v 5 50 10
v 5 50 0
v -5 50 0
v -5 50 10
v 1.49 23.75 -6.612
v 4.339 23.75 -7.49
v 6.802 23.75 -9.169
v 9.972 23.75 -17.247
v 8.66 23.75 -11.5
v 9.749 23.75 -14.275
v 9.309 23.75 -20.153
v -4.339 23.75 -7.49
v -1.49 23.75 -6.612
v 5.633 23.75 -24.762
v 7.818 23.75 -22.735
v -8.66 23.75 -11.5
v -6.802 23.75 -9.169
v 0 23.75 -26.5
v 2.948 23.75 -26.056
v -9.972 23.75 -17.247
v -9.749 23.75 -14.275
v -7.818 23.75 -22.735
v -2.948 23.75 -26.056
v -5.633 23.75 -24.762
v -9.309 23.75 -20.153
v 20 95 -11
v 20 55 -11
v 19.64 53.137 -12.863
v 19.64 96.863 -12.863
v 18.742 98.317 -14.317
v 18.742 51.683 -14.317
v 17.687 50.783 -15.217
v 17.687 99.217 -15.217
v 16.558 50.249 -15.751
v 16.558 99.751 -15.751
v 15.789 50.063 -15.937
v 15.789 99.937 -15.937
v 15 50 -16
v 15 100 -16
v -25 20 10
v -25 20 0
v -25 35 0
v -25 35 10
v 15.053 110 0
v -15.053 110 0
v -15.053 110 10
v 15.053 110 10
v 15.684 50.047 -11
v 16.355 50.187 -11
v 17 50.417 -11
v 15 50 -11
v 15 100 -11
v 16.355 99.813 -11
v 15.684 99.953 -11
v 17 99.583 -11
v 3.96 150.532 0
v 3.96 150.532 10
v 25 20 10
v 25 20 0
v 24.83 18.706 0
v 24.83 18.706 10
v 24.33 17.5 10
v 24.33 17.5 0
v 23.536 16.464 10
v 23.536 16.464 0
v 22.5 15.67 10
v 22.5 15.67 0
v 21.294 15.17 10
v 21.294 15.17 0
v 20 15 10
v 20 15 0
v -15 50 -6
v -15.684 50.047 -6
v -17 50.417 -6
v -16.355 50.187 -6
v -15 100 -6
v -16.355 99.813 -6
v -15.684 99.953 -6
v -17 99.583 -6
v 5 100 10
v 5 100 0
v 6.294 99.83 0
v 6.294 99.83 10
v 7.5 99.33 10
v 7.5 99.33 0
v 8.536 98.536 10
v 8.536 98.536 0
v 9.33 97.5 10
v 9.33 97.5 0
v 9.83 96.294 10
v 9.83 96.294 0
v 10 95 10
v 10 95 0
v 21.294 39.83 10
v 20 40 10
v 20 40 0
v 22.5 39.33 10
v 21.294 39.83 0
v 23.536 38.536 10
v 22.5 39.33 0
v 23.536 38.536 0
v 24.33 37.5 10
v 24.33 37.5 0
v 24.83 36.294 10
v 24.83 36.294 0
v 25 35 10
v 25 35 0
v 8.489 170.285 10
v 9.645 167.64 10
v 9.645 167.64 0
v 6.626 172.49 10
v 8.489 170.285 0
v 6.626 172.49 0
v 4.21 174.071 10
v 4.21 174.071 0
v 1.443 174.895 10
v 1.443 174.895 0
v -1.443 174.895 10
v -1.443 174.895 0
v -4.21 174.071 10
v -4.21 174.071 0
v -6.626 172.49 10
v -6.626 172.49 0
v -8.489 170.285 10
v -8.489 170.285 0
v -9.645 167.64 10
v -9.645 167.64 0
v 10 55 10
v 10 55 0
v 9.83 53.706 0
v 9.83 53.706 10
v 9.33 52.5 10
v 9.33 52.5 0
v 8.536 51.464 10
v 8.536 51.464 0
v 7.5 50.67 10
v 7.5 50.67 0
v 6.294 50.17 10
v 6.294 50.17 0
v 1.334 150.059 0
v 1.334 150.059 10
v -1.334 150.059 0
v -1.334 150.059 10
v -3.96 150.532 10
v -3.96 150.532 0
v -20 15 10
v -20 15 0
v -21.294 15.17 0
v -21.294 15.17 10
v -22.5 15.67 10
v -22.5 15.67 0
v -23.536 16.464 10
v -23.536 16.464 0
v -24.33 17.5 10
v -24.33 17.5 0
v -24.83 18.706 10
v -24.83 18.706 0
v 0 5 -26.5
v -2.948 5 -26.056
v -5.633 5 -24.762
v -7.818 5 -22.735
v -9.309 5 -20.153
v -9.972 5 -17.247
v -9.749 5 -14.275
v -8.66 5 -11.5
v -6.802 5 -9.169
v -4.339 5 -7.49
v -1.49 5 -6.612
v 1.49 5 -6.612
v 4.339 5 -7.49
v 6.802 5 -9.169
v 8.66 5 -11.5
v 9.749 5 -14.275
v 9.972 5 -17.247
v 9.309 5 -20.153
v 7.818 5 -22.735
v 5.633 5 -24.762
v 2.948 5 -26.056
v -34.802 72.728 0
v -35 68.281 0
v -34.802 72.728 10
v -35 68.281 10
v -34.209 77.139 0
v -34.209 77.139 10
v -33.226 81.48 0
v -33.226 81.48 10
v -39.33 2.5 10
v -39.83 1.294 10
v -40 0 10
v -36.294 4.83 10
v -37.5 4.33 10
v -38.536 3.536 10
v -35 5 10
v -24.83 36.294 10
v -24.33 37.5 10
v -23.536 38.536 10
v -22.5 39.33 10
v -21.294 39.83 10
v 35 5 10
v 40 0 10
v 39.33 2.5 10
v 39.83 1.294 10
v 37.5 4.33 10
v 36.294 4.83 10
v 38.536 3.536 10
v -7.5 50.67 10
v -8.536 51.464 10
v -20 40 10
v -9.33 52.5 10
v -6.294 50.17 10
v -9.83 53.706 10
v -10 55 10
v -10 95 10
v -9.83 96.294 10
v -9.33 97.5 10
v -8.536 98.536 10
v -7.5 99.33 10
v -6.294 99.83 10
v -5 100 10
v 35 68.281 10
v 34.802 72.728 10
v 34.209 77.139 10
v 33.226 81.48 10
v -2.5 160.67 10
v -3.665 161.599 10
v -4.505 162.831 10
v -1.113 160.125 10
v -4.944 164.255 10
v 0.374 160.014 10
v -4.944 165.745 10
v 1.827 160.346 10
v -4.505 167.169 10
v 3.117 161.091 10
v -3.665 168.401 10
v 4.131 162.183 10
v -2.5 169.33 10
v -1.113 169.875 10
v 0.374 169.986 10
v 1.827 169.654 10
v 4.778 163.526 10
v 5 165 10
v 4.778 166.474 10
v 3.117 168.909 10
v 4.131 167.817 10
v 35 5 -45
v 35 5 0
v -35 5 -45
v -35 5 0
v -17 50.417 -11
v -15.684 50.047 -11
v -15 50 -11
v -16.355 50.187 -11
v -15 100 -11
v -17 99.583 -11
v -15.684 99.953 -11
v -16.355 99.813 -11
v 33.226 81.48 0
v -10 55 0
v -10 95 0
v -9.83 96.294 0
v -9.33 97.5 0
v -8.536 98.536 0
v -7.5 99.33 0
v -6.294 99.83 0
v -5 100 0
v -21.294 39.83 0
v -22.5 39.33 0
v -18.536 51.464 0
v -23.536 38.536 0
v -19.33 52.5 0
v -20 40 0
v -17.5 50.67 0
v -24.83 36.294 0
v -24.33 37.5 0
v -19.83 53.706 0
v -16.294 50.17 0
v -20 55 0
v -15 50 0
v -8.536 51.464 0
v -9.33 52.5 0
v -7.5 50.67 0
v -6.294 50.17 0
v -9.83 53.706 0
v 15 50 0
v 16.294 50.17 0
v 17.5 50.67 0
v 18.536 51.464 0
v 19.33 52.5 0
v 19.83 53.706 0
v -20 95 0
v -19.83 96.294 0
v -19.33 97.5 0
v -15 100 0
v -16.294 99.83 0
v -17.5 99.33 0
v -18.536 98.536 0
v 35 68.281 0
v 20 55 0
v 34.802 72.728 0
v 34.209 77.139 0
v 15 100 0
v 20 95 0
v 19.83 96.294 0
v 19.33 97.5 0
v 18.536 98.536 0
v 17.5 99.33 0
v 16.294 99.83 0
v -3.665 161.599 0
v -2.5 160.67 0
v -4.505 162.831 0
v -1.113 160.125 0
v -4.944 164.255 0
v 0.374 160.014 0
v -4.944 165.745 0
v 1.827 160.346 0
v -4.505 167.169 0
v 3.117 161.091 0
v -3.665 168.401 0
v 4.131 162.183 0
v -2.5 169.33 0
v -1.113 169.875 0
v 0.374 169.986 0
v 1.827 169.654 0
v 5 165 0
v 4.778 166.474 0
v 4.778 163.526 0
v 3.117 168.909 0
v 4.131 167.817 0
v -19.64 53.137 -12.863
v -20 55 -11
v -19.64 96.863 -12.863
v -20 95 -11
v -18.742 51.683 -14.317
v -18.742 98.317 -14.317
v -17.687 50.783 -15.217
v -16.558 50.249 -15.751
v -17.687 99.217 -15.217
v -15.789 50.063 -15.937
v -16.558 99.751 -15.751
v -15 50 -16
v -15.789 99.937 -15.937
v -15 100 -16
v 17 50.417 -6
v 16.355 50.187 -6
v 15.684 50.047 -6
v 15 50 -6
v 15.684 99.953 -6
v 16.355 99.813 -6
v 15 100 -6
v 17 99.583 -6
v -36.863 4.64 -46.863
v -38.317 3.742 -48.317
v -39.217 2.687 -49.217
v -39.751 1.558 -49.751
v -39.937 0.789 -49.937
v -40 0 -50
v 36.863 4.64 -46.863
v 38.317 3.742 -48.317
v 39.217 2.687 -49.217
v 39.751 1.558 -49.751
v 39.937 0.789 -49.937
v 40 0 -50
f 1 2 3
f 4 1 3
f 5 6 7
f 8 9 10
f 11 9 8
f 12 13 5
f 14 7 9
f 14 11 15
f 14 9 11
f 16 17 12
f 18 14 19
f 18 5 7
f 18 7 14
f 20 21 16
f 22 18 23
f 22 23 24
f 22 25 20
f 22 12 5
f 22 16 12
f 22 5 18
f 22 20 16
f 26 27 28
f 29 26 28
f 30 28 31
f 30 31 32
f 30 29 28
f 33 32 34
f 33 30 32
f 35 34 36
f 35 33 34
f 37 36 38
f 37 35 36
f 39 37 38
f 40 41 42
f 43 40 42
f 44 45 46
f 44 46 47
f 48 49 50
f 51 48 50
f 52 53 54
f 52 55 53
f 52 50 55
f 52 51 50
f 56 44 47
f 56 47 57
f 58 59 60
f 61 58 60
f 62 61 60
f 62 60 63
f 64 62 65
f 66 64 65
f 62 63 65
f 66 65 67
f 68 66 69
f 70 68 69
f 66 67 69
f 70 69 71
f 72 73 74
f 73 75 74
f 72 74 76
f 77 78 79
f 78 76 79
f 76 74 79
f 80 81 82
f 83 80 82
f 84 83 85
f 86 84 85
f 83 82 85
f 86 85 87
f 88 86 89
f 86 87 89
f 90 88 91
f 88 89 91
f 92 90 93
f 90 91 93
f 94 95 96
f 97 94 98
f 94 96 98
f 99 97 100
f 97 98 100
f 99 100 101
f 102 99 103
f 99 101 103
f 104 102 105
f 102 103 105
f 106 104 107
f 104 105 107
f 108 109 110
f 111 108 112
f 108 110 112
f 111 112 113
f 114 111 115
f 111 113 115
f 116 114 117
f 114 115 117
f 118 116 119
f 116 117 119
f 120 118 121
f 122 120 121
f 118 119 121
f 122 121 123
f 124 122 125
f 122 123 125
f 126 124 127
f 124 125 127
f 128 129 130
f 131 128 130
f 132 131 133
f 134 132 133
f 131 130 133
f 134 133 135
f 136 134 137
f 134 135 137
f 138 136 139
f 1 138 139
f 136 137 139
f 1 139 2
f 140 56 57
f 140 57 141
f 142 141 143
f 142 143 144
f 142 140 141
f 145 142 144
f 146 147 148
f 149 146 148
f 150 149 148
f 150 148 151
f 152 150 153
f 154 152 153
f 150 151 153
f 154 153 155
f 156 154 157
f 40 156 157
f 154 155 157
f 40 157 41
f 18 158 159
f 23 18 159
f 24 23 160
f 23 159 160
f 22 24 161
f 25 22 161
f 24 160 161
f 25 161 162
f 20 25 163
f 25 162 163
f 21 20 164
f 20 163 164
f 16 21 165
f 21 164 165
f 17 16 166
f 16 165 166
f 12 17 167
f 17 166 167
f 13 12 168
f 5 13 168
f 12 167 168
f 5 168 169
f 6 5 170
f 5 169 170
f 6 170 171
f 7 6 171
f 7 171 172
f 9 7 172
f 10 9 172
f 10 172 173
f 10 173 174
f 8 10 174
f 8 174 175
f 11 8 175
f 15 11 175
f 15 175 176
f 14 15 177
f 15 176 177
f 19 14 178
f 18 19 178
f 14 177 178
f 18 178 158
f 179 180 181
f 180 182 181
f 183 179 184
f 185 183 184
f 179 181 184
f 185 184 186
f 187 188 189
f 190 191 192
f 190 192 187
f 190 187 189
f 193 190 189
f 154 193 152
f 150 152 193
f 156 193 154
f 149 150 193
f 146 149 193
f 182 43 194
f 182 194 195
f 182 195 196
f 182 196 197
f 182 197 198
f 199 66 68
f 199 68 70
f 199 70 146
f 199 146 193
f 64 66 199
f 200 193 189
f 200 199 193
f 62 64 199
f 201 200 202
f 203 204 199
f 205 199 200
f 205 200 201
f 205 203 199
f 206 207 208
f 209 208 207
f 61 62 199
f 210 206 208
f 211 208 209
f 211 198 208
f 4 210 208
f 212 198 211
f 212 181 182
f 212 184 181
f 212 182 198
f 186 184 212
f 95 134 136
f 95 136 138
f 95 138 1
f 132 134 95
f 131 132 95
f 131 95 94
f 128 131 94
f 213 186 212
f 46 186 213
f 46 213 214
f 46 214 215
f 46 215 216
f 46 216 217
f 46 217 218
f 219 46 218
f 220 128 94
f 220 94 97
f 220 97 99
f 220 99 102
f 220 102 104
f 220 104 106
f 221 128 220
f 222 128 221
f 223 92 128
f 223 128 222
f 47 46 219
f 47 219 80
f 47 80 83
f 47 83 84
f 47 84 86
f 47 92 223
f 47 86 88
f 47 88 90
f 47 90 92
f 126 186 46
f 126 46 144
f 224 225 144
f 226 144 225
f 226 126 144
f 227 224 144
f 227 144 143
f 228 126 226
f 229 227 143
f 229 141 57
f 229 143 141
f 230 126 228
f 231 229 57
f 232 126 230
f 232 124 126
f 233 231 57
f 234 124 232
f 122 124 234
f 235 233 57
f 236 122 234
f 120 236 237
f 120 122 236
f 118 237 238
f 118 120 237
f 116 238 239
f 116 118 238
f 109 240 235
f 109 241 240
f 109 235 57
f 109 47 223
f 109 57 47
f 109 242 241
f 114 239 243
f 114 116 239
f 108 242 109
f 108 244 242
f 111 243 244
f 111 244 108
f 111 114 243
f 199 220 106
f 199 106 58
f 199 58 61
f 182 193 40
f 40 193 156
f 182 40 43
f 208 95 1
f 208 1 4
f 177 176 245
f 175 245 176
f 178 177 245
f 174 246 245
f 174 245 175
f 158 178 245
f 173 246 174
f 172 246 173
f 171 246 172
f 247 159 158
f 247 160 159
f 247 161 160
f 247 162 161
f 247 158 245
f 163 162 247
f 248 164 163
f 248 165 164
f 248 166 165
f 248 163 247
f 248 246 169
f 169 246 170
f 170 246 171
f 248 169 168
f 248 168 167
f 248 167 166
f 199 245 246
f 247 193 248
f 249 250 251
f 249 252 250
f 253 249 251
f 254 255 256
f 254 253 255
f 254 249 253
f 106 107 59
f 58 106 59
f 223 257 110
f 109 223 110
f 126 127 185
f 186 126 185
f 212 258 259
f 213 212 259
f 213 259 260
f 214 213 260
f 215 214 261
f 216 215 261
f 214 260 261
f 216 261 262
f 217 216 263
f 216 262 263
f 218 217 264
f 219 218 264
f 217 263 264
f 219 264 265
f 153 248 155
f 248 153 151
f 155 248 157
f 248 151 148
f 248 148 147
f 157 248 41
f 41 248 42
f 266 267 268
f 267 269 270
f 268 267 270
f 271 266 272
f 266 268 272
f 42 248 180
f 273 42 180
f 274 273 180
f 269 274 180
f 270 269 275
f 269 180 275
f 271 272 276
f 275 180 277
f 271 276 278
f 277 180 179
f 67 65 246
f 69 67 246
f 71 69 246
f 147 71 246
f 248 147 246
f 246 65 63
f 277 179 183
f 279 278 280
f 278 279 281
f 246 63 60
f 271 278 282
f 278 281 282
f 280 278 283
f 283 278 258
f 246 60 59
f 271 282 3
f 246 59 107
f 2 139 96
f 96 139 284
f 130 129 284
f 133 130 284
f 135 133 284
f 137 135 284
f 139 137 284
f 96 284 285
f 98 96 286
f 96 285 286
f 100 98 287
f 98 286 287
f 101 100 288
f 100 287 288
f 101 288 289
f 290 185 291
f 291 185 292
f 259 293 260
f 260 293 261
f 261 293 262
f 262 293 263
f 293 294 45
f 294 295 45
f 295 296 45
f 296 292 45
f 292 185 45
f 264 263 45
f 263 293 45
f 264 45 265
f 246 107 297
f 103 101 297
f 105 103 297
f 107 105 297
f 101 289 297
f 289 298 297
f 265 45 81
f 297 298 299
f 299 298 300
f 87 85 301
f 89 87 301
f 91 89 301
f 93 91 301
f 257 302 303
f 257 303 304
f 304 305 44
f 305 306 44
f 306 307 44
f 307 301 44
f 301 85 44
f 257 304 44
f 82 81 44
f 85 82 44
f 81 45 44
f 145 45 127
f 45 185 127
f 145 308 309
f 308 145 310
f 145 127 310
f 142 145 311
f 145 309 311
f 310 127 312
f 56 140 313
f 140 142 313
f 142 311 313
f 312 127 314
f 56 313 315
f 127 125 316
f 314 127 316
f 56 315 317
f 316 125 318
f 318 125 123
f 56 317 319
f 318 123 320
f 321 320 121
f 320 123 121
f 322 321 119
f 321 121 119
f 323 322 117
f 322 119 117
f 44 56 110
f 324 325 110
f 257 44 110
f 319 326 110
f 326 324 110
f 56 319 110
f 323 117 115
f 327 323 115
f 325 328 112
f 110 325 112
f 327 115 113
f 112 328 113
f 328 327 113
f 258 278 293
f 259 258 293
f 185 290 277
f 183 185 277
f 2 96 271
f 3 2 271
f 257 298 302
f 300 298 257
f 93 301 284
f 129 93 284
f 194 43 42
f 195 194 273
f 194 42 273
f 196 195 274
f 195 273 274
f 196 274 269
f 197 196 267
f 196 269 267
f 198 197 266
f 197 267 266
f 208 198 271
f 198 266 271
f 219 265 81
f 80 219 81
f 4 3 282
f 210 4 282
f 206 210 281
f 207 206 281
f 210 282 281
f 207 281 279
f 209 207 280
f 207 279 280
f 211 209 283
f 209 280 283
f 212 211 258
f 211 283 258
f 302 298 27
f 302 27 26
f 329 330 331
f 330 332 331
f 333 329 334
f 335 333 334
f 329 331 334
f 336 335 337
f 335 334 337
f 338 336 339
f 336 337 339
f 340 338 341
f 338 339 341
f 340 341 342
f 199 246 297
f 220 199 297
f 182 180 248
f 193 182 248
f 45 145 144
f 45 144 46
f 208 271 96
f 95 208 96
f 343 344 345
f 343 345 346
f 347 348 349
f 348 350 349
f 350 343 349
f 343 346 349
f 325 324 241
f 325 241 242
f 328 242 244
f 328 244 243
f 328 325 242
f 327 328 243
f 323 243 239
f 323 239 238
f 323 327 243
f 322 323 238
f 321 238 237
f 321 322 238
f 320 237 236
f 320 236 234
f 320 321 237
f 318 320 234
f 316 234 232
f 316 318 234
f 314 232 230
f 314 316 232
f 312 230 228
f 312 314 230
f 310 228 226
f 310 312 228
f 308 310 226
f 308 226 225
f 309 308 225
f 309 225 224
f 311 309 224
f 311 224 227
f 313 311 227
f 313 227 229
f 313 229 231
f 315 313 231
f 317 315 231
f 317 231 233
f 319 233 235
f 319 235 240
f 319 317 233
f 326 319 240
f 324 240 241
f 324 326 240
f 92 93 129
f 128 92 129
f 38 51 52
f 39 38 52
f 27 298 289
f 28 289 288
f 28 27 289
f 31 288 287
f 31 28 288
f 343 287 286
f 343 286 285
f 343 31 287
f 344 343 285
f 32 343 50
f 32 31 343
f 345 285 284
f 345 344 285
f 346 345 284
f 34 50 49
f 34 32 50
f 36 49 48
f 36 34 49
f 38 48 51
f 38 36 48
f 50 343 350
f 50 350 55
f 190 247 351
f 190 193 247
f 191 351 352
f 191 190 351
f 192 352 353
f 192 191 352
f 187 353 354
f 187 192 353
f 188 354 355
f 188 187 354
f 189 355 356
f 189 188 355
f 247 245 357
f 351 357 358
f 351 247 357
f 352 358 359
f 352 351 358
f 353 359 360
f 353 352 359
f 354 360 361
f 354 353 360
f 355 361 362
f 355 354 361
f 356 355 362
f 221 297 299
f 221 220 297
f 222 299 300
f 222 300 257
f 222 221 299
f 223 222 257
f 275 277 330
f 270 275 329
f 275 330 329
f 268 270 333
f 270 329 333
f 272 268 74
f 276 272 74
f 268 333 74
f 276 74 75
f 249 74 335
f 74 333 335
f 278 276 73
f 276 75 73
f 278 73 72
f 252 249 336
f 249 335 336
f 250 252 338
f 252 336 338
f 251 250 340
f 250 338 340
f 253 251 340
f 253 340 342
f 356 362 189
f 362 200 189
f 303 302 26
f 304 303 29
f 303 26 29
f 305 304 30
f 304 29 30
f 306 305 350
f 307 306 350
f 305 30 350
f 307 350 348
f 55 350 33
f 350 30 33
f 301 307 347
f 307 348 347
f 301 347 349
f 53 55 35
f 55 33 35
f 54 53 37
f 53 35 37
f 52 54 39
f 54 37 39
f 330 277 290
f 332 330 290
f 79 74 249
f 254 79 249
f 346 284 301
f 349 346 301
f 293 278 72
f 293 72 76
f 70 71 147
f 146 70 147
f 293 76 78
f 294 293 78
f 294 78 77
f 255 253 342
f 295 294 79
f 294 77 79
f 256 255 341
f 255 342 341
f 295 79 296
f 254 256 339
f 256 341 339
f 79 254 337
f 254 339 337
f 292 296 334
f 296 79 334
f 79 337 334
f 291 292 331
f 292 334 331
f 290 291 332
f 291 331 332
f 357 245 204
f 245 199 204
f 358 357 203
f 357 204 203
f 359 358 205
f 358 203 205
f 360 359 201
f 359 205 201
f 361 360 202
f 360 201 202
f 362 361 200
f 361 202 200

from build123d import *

# Parameters (mm, degrees)
SKETCH1_R               = 5
BOSS_EXTRUDE1_DEPTH     = 10
SKETCH2_W               = 80
SKETCH2_H               = 5
BOSS_EXTRUDE2_DEPTH     = 50
SKETCH3_W               = 5
SKETCH3_H               = 50
BOSS_EXTRUDE3_DEPTH     = 16
FILLET1_R               = 50
FILLET3_R               = 5
FILLET7_R               = 5
FILLET8_R               = 5
CUT_EXTRUDE4_DEPTH      = 32
CUT_EXTRUDE4_DEPTH_BACK = 2
SKETCH8_W               = 5
SKETCH8_H               = 50
SKETCH11_R              = 10
BOSS_EXTRUDE5_DEPTH     = 18.75
CUT_EXTRUDE9_DEPTH      = 45


with BuildPart() as part:
    # Sketch1 → Boss-Extrude1 (new body)
    with BuildSketch(Plane.XY):
        with BuildLine():
            Line((-40, 5), (-40, 0))
            Line((-40, 0), (40, 0))
            Line((40, 0), (40, 5))
            Line((40, 5), (35, 5))
            Line((35, 5), (35, 75))
            Line((35, 75), (9.645273695, 167.639828659))
            ThreePointArc((9.645273695, 167.639828659), (0, 175), (-9.645273695, 167.639828659))
            Line((-9.645273695, 167.639828659), (-35, 75))
            Line((-35, 75), (-35, 5))
            Line((-35, 5), (-40, 5))
        make_face()
        with Locations((0, 165)):
            Circle(SKETCH1_R, mode=Mode.SUBTRACT)
    extrude(amount=BOSS_EXTRUDE1_DEPTH)

    # Sketch2 → Boss-Extrude2 (add)
    with BuildSketch(Plane(origin=(0, 0, 0), x_dir=(-1, 0, 0), z_dir=(0, 0, -1))):
        with Locations((0, 2.5)):
            Rectangle(SKETCH2_W, SKETCH2_H)
    extrude(amount=BOSS_EXTRUDE2_DEPTH)

    # Sketch3 → Boss-Extrude3 (add)
    with BuildSketch(Plane(origin=(0, 0, 0), x_dir=(-1, 0, 0), z_dir=(0, 0, -1))):
        with Locations((-17.5, 75)):
            Rectangle(SKETCH3_W, SKETCH3_H)
        with Locations((17.5, 75)):
            Rectangle(SKETCH3_W, SKETCH3_H)
    extrude(amount=BOSS_EXTRUDE3_DEPTH)

    # Fillet1
    fillet1_edges = [part.edges().sort_by_distance(p)[0] for p in [
        (-35, 75, 5),
        (35, 75, 5),
    ]]
    fillet(fillet1_edges, radius=FILLET1_R)

    # Fillet3
    fillet3_edges = [part.edges().sort_by_distance(p)[0] for p in [
        (0, 5, -50),
        (-40, 5, -20),
        (40, 5, -20),
    ]]
    fillet(fillet3_edges, radius=FILLET3_R - 0.0001)  # a hair under: the kernel refuses the full size

    # Fillet7
    fillet7_edges = [part.edges().sort_by_distance(p)[0] for p in [
        (20, 75, -16),
        (20, 50, -8),
        (20, 100, -8),
    ]]
    fillet(fillet7_edges, radius=FILLET7_R - 0.0001)  # a hair under: the kernel refuses the full size

    # Fillet8
    fillet8_edges = [part.edges().sort_by_distance(p)[0] for p in [
        (-20, 50, -8),
        (-20, 75, -16),
        (-20, 100, -8),
    ]]
    fillet(fillet8_edges, radius=FILLET8_R - 0.0001)  # a hair under: the kernel refuses the full size

    # Sketch8 → Cut-Extrude4 (cut, two sides: drawn at the far end of the back side and taken through both)
    with BuildSketch(Plane(origin=(-15, 0, 0), x_dir=(0, 0, -1), z_dir=(1, 0, 0)).offset(-CUT_EXTRUDE4_DEPTH_BACK)):
        with Locations((8.5, 75)):
            Rectangle(SKETCH8_W, SKETCH8_H)
    extrude(amount=CUT_EXTRUDE4_DEPTH + CUT_EXTRUDE4_DEPTH_BACK, mode=Mode.SUBTRACT)

    # Sketch11 → Boss-Extrude5 (add)
    with BuildSketch(Plane(origin=(0, 5, 0), x_dir=(1, 0, 0), z_dir=(0, 1, 0))):
        with Locations(Location((0, 16.5, 0), (0, 0, 90))):
            Circle(SKETCH11_R)
    extrude(amount=BOSS_EXTRUDE5_DEPTH)

    # Sketch14 → Cut-Extrude9 (cut)
    with BuildSketch(Plane(origin=(0, 0, 0), x_dir=(-1, 0, 0), z_dir=(0, 0, -1))):
        with BuildLine():
            Line((-25, 35), (-25, 20))
            ThreePointArc((-25, 20), (-23.535533906, 16.464466094), (-20, 15))
            Line((-20, 15), (20, 15))
            ThreePointArc((20, 15), (23.535533906, 16.464466094), (25, 20))
            Line((25, 20), (25, 35))
            ThreePointArc((25, 35), (23.535533906, 38.535533906), (20, 40))
            Line((20, 40), (-20, 40))
            ThreePointArc((-20, 40), (-23.535533906, 38.535533906), (-25, 35))
        make_face()
        with BuildLine():
            ThreePointArc((-3.959742989, 150.532089458), (0, 150), (3.959742989, 150.532089458))
            Line((3.959742989, 150.532089458), (15.05302813, 110))
            Line((15.05302813, 110), (-15.05302813, 110))
            Line((-15.05302813, 110), (-3.959742989, 150.532089458))
        make_face()
        with BuildLine():
            Line((-10, 95), (-10, 55))
            ThreePointArc((-10, 55), (-8.535533906, 51.464466094), (-5, 50))
            Line((-5, 50), (5, 50))
            ThreePointArc((5, 50), (8.535533906, 51.464466094), (10, 55))
            Line((10, 55), (10, 95))
            ThreePointArc((10, 95), (8.535533906, 98.535533906), (5, 100))
            Line((5, 100), (-5, 100))
            ThreePointArc((-5, 100), (-8.535533906, 98.535533906), (-10, 95))
        make_face()
    extrude(amount=-CUT_EXTRUDE9_DEPTH, mode=Mode.SUBTRACT)


solid = part.part
